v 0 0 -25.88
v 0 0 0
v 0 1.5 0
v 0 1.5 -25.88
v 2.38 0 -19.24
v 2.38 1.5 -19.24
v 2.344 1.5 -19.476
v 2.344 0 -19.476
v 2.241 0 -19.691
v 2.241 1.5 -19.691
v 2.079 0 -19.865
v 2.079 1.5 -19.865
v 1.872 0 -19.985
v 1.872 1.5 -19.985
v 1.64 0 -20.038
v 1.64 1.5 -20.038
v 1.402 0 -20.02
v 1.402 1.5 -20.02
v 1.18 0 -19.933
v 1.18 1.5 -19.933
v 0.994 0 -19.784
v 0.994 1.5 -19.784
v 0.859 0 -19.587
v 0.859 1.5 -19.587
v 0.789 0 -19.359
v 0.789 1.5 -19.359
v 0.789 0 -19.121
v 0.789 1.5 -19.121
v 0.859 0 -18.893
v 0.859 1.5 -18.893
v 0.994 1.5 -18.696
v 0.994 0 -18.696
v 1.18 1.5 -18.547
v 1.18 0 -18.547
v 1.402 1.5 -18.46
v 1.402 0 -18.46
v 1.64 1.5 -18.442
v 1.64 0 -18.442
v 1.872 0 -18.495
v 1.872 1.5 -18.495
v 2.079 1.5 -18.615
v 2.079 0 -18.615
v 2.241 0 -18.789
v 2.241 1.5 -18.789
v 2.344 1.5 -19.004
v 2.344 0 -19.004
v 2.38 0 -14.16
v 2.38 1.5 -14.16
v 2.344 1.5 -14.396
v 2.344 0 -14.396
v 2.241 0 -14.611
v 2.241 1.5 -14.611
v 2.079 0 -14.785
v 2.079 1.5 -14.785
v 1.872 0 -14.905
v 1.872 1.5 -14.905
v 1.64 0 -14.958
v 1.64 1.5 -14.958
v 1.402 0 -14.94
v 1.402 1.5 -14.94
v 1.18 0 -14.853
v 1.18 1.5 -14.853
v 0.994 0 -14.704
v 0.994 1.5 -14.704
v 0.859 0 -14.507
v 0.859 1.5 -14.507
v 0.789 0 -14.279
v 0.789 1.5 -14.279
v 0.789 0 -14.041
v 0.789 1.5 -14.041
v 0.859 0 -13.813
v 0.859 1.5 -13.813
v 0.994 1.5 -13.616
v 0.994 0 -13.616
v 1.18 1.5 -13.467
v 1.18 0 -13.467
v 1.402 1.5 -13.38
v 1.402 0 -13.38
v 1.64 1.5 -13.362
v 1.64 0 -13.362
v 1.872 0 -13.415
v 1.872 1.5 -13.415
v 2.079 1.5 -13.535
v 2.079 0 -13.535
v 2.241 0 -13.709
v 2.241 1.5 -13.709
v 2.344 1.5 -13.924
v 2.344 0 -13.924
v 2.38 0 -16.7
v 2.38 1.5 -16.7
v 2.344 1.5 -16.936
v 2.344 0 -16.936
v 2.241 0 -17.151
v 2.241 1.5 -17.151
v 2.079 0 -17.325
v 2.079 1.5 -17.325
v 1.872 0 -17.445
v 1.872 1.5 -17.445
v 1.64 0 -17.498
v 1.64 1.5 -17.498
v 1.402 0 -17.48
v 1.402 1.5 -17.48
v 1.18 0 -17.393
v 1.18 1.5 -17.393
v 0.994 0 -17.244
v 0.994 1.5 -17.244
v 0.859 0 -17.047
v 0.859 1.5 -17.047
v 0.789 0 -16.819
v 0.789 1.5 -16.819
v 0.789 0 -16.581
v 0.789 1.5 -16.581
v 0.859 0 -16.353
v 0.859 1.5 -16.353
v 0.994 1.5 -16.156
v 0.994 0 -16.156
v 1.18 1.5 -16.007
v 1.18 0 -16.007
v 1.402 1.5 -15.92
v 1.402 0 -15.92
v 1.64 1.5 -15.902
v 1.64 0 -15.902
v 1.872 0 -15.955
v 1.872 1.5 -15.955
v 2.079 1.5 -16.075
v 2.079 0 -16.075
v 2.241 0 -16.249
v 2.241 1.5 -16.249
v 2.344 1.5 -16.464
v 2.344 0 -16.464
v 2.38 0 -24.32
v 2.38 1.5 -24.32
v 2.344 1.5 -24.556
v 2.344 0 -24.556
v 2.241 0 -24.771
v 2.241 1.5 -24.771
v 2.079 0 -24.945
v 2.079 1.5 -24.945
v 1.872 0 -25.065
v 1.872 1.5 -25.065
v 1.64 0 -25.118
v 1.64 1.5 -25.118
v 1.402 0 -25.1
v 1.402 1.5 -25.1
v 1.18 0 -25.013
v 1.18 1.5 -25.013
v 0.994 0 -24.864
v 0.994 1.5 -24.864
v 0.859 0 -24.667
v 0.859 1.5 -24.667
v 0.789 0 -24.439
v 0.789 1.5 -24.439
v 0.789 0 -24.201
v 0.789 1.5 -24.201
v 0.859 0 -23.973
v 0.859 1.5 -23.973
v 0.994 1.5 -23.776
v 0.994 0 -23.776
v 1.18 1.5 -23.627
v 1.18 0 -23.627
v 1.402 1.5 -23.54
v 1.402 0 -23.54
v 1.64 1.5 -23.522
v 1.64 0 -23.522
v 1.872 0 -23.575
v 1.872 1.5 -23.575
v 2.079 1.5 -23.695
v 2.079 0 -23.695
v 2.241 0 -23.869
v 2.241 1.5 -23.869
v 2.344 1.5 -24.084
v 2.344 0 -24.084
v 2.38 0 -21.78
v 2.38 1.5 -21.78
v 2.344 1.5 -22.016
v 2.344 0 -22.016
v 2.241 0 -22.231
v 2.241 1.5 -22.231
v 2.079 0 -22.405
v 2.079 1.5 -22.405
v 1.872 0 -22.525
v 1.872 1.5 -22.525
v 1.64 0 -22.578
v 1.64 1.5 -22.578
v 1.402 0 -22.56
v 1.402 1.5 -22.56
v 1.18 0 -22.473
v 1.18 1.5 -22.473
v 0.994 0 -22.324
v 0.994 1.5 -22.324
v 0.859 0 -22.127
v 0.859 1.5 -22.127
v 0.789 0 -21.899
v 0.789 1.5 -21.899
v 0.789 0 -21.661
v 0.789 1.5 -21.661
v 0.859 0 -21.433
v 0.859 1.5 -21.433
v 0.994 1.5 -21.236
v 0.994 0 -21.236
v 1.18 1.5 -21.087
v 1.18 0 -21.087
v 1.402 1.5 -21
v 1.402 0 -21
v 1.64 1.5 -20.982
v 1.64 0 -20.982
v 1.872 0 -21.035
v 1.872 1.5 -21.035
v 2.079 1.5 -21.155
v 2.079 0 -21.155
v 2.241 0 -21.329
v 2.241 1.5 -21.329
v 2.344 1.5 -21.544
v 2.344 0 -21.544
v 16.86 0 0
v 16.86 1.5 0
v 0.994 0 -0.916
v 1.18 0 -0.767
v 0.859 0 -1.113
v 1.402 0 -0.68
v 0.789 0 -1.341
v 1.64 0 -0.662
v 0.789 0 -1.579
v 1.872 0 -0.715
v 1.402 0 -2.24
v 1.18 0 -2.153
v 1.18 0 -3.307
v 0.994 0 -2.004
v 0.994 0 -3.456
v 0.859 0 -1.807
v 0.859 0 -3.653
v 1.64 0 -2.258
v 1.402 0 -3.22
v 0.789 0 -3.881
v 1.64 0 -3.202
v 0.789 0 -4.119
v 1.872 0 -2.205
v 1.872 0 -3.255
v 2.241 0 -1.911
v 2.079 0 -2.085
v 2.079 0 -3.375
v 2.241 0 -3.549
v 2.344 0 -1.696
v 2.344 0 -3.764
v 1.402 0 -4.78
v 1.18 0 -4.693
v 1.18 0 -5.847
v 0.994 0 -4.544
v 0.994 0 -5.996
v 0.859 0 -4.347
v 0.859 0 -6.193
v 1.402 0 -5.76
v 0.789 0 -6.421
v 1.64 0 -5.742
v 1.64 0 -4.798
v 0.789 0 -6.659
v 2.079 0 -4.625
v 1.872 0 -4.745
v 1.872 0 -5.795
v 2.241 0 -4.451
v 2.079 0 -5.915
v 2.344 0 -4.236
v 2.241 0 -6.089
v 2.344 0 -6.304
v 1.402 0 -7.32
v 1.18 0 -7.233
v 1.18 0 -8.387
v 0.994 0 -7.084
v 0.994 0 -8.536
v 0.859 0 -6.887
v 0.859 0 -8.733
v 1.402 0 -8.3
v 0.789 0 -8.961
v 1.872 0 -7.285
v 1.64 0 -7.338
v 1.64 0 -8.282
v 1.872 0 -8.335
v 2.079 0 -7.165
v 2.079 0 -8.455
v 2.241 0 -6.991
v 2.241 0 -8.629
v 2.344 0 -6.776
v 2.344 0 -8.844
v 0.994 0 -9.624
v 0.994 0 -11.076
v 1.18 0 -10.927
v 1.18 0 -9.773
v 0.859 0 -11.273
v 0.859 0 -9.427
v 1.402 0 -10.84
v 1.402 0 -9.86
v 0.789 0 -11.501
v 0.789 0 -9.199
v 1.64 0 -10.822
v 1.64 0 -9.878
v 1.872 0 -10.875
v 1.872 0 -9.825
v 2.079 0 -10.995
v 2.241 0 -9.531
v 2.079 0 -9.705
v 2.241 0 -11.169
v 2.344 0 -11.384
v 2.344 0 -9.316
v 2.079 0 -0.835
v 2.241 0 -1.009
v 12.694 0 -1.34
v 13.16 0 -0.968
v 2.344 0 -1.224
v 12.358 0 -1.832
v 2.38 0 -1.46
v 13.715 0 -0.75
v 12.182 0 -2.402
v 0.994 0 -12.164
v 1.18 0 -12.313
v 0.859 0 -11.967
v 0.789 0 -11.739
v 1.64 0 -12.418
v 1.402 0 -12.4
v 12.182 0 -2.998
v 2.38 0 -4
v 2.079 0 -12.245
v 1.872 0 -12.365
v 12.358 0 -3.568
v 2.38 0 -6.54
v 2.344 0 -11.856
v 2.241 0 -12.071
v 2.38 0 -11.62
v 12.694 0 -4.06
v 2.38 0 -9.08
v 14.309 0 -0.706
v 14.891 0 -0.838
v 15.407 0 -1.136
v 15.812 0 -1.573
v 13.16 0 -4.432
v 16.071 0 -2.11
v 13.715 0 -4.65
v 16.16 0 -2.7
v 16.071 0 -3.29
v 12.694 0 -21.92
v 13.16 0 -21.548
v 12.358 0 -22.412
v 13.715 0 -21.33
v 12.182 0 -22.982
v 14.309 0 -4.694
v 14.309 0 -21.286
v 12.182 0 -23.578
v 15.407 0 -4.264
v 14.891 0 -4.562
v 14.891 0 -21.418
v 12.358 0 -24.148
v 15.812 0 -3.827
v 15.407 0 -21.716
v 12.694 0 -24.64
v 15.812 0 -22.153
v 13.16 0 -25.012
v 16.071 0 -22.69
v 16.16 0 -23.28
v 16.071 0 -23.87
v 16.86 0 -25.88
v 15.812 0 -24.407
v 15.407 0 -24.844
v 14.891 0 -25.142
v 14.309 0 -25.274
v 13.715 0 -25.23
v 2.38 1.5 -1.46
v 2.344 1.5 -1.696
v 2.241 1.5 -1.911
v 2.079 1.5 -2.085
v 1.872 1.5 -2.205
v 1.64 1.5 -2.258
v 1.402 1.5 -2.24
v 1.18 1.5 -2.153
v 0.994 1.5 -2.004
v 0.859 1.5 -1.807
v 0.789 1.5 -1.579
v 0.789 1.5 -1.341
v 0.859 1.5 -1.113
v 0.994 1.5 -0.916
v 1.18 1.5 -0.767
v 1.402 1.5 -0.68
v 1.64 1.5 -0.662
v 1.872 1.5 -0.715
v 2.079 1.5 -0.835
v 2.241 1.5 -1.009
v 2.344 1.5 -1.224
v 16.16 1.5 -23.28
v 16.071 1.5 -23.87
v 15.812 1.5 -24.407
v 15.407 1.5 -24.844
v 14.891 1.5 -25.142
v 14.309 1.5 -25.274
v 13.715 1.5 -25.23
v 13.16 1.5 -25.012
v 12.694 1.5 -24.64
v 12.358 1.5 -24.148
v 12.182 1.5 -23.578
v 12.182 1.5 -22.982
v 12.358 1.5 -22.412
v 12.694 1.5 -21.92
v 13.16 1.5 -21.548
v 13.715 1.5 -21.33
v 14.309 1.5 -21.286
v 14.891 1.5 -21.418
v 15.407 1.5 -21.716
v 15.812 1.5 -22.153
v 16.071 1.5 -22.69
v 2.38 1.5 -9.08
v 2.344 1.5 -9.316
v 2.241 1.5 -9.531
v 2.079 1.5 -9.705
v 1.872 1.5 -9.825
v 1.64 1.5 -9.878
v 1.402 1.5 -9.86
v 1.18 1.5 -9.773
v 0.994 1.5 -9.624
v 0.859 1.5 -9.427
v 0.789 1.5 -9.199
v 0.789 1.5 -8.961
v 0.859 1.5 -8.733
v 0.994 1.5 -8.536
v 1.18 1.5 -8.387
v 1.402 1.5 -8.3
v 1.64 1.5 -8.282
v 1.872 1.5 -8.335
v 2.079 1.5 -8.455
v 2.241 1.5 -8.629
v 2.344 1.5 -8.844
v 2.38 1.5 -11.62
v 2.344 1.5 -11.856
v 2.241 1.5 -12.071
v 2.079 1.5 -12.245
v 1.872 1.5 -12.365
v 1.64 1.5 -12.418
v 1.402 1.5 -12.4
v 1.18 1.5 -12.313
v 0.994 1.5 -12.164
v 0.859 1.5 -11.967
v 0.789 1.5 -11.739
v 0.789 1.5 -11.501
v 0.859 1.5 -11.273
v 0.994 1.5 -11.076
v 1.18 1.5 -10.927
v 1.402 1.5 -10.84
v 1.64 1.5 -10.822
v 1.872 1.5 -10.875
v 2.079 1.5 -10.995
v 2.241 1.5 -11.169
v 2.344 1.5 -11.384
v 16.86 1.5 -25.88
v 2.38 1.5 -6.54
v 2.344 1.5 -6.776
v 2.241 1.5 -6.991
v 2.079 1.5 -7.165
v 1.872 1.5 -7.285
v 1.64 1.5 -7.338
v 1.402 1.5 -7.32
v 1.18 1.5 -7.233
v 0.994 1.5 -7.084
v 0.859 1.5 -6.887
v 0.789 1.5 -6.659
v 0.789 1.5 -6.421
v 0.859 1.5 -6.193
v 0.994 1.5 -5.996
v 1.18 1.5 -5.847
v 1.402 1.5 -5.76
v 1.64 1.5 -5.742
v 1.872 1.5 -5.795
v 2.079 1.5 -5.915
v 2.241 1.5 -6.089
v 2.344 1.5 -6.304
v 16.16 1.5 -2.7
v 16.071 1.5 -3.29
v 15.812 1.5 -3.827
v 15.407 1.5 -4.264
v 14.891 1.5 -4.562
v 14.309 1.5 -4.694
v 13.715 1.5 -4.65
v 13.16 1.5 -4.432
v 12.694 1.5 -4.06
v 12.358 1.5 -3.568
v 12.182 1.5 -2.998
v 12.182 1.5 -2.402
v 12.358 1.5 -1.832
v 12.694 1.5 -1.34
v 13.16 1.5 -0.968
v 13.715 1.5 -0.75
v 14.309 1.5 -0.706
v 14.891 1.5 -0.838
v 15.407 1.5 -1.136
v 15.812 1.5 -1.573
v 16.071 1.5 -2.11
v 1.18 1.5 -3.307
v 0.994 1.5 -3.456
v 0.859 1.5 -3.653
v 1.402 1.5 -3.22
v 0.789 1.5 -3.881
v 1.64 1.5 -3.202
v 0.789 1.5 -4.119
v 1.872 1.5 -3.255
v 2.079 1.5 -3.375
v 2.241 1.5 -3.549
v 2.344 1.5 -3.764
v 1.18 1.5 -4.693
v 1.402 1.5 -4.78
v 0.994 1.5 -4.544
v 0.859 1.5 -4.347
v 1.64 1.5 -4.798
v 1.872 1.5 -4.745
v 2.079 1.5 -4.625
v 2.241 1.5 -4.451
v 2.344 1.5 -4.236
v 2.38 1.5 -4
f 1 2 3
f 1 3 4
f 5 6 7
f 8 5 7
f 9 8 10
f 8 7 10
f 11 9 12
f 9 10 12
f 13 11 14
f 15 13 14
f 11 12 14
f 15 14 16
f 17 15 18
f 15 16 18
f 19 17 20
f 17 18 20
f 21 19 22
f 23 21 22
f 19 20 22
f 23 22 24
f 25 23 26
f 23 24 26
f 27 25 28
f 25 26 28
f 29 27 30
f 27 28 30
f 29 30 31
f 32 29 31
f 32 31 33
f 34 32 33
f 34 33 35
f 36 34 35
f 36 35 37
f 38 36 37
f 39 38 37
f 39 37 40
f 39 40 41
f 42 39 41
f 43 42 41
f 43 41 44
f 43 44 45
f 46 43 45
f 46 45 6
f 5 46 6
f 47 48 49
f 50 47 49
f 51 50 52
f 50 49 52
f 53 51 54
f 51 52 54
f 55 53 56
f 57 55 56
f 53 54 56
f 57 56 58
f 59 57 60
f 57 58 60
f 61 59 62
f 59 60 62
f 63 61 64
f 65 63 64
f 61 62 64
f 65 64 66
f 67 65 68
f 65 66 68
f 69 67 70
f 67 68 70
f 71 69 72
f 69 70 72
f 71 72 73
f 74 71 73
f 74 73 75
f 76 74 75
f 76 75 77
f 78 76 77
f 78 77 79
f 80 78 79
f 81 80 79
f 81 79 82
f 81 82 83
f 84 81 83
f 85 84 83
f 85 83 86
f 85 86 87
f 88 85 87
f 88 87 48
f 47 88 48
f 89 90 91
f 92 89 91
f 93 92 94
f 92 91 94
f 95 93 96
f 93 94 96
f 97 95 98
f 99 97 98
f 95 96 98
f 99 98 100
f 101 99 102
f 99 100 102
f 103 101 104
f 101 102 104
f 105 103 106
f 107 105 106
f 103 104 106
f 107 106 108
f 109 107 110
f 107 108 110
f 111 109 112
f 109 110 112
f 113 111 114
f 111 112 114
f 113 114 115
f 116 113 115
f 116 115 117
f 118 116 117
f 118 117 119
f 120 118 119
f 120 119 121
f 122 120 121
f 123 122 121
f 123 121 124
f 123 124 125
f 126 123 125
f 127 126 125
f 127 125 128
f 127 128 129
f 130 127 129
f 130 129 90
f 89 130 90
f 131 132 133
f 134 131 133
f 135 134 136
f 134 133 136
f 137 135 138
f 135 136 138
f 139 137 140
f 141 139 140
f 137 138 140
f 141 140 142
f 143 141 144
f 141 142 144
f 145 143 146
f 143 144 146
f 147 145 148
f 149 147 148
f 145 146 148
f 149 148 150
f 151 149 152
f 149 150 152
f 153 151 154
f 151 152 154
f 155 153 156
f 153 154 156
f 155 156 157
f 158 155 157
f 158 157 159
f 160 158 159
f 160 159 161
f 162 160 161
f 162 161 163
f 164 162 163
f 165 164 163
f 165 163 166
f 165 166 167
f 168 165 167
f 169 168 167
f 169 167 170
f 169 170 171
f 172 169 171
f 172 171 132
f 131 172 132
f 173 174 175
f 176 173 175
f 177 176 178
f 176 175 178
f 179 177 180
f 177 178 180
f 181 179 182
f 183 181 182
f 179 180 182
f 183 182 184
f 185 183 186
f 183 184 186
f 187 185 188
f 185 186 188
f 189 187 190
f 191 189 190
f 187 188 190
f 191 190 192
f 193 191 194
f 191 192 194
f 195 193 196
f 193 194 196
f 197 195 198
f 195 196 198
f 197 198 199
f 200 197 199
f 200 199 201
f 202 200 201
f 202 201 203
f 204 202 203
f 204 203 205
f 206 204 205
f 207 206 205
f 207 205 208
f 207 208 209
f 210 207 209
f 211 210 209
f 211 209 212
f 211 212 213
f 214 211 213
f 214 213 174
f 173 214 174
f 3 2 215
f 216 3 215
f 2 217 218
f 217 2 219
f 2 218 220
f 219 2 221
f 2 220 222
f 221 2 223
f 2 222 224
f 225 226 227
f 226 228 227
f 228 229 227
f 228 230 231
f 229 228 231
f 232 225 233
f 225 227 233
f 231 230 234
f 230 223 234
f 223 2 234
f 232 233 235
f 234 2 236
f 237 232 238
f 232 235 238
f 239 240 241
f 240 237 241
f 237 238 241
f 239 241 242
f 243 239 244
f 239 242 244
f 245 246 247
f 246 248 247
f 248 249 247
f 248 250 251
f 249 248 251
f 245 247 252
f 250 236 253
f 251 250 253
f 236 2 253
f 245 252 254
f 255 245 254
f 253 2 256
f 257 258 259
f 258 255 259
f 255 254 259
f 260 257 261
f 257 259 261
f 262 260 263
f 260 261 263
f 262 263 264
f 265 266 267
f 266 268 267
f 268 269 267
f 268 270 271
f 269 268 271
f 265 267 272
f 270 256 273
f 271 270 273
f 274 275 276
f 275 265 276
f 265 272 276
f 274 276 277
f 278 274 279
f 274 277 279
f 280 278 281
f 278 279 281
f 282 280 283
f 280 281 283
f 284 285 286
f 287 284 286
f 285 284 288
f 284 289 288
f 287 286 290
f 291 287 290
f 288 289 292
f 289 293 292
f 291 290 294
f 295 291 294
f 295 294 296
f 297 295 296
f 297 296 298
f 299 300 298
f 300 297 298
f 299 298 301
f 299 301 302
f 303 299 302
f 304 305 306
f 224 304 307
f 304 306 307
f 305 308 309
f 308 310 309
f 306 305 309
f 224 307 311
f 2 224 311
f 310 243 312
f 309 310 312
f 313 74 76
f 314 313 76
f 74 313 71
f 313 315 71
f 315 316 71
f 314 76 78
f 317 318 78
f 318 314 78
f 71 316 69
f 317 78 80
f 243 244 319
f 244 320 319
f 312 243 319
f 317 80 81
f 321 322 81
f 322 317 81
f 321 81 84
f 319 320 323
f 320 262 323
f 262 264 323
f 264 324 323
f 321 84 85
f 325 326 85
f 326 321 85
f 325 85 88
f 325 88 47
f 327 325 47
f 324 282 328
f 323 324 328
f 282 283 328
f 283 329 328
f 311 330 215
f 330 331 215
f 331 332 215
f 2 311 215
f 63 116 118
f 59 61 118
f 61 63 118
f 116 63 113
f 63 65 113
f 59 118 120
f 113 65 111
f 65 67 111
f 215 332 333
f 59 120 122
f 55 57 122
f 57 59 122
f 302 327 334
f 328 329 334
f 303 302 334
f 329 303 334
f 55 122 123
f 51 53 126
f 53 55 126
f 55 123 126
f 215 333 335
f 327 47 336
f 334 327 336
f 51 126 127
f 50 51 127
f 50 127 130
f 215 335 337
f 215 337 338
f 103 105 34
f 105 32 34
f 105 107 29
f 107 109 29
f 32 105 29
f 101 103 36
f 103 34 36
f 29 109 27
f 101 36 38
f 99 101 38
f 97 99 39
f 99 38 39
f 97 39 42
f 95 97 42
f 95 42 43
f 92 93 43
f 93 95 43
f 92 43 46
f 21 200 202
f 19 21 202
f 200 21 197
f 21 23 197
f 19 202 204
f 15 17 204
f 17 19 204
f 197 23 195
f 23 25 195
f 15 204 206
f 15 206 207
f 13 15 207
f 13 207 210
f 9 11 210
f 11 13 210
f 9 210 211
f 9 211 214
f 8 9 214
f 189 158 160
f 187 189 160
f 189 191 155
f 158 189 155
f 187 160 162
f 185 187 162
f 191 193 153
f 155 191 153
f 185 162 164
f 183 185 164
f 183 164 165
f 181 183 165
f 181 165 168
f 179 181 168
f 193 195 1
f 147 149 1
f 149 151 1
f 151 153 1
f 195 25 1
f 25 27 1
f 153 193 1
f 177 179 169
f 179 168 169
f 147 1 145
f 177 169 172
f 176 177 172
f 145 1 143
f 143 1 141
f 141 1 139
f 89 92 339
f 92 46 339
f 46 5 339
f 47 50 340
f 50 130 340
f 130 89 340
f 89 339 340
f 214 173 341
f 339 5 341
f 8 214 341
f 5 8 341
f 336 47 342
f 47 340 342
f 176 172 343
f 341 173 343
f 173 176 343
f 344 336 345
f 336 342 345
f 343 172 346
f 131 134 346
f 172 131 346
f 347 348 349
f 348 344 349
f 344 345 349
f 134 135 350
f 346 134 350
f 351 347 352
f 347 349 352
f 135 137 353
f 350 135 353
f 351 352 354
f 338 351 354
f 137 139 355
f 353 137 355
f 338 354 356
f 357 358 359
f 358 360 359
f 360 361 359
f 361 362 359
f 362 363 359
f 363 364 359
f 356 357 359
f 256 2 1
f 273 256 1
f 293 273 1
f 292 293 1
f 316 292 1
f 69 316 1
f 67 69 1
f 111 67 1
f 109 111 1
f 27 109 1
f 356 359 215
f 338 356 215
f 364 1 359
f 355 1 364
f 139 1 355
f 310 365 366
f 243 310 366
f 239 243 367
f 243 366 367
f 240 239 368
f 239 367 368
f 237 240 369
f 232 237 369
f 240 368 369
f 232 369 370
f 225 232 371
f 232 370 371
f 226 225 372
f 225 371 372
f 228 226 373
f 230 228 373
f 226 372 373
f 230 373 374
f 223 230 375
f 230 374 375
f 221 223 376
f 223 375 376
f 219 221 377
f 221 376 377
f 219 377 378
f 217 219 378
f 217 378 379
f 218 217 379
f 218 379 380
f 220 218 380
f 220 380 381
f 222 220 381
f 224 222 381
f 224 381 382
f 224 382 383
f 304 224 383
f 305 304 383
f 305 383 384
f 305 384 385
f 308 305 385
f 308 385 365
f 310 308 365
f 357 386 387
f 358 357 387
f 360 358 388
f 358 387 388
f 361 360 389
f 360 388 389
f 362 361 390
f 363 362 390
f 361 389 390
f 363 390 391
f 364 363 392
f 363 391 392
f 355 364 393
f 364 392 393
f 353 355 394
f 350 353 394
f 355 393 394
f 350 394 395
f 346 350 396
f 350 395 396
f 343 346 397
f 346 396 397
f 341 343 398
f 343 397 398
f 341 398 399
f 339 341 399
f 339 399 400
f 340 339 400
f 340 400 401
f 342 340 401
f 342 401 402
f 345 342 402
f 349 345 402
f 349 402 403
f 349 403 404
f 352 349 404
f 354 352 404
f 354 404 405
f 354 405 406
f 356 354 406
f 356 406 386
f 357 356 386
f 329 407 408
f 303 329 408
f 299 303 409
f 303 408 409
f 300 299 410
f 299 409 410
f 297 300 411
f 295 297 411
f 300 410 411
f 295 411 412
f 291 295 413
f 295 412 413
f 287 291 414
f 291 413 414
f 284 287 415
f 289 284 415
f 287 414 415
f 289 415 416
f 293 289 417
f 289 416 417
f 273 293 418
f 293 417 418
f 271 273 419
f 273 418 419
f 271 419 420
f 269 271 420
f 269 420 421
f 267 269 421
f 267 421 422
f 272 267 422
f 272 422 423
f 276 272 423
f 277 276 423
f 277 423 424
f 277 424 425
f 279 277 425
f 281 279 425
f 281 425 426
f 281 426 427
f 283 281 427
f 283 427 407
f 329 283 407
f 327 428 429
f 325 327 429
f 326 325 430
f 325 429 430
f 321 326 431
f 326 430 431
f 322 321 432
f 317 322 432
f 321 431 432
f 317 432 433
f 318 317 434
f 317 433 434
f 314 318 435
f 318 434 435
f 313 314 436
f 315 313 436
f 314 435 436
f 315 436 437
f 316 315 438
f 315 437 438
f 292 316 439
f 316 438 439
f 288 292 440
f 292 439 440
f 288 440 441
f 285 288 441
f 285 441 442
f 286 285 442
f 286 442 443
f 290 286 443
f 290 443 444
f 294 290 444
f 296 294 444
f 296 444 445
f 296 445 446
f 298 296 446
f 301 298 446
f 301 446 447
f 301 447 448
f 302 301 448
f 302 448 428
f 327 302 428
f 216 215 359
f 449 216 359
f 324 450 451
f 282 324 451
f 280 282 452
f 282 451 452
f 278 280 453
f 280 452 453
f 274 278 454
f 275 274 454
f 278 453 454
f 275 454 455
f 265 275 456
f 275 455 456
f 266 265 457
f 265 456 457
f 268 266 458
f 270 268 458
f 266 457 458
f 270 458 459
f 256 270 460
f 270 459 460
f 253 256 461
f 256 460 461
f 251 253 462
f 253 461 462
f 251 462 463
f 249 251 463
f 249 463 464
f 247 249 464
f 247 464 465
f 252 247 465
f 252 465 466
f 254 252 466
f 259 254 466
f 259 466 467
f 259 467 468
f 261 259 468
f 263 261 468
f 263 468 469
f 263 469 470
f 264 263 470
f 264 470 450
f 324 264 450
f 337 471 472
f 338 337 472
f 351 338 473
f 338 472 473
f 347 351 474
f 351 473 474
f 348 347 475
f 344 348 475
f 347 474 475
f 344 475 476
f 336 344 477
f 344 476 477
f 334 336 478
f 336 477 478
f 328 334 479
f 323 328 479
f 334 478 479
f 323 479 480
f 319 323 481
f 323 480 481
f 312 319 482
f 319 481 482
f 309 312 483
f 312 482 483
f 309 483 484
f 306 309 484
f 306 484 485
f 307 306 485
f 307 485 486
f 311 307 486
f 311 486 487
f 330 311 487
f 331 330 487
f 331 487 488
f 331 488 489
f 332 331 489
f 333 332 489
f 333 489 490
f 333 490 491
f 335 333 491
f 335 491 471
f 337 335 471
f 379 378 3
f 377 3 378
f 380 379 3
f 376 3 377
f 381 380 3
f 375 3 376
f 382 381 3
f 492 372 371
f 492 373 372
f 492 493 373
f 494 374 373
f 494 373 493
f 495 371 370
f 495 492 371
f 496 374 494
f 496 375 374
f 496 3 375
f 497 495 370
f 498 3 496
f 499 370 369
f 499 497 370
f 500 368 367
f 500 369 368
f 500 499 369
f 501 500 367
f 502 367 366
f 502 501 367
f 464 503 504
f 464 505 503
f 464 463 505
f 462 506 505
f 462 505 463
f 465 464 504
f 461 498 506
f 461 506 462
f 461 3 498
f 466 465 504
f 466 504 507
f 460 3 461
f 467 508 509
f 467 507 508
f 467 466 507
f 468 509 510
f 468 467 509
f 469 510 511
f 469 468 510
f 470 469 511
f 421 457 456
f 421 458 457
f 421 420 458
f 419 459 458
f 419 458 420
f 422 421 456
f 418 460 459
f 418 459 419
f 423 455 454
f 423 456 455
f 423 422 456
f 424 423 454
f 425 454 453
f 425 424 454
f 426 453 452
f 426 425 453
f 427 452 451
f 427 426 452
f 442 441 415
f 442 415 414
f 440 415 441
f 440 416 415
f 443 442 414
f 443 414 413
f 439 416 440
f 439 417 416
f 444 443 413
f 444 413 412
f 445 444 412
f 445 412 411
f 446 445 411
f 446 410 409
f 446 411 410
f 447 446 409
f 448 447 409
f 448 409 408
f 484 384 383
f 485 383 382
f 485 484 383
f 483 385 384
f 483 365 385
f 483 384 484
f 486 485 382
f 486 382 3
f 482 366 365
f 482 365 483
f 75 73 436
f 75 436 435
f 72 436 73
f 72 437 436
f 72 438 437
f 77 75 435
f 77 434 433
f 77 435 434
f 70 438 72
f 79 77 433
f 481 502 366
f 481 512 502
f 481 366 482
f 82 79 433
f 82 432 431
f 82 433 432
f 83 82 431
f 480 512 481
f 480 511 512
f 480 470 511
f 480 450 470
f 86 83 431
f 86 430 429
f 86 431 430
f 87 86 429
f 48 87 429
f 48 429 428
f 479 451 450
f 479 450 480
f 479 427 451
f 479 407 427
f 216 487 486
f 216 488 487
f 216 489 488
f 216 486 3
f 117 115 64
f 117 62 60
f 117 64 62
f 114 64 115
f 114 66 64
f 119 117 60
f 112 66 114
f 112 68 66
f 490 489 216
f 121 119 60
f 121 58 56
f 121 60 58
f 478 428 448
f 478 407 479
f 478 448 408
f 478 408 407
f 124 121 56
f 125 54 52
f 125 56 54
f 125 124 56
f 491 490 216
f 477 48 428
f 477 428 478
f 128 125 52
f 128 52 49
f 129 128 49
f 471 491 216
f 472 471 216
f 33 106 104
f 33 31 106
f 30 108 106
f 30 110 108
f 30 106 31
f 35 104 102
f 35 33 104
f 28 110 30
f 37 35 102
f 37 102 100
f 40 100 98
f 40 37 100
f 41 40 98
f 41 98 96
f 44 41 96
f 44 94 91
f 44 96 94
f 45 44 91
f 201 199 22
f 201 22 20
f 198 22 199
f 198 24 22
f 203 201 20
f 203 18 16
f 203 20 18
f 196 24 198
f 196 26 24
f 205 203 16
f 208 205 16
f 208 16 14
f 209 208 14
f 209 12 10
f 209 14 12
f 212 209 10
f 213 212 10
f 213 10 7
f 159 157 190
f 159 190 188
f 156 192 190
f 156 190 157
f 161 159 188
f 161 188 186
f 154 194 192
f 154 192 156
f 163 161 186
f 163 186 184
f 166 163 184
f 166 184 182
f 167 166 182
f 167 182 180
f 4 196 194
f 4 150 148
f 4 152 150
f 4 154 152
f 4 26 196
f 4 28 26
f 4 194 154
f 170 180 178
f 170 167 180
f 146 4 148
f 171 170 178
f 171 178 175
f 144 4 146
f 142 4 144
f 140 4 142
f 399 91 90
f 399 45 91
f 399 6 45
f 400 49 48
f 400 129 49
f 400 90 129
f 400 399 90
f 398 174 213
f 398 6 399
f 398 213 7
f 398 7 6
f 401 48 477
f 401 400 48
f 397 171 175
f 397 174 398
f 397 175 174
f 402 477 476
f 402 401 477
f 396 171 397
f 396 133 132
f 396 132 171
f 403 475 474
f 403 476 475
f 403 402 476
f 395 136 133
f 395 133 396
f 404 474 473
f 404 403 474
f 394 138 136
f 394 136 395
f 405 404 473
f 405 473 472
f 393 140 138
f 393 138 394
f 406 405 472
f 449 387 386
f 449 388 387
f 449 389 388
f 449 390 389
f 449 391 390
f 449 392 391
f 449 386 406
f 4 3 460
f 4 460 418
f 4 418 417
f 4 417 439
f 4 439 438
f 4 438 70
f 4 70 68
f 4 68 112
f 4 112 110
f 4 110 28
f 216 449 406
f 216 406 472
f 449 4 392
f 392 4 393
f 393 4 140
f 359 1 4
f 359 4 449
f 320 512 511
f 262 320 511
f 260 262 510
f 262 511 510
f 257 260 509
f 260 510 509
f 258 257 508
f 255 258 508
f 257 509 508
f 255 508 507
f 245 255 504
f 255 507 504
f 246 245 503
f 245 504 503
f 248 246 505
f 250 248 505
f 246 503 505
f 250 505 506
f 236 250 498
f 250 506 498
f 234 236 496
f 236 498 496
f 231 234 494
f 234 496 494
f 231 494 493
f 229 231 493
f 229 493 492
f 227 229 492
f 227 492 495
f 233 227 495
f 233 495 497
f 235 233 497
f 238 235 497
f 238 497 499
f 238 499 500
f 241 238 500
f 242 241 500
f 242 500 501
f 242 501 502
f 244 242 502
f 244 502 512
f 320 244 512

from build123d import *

# Parameters (mm, degrees)
SKETCH1_W           = 16.86
SKETCH1_H           = 25.88
BOSS_EXTRUDE1_DEPTH = 1.5
CUT_EXTRUDE1_REACH  = 3.5
SKETCH2_R           = 2
CUT_EXTRUDE2_REACH  = 3.5
SKETCH3_R           = 0.8


with BuildPart() as part:
    # Sketch1 → Boss-Extrude1 (new body)
    with BuildSketch(Plane(origin=(0, 0, 0), x_dir=(1, 0, 0), z_dir=(0, 1, 0))):
        with Locations((8.43, 12.94)):
            Rectangle(SKETCH1_W, SKETCH1_H)
    extrude(amount=BOSS_EXTRUDE1_DEPTH)

    # Sketch2 → Cut-Extrude1 (cut, up to next)
    with BuildSketch(Plane(origin=(0, 1.5, 0), x_dir=(1, 0, 0), z_dir=(0, 1, 0)), mode=Mode.PRIVATE) as cut_extrude1_sk1:
        with Locations((14.16, 23.28)):
            Circle(SKETCH2_R)
    cut_extrude1_tool1 = extrude(cut_extrude1_sk1.sketch, amount=-CUT_EXTRUDE1_REACH, mode=Mode.PRIVATE) & part.part
    add(cut_extrude1_tool1.solids().sort_by_distance((14.16, 1.5, -23.28))[0], mode=Mode.SUBTRACT)
    # Sketch2 → Cut-Extrude1 (cut, up to next)
    with BuildSketch(Plane(origin=(0, 1.5, 0), x_dir=(1, 0, 0), z_dir=(0, 1, 0)), mode=Mode.PRIVATE) as cut_extrude1_sk2:
        with Locations((14.16, 2.7)):
            Circle(SKETCH2_R)
    cut_extrude1_tool2 = extrude(cut_extrude1_sk2.sketch, amount=-CUT_EXTRUDE1_REACH, mode=Mode.PRIVATE) & part.part
    add(cut_extrude1_tool2.solids().sort_by_distance((14.16, 1.5, -2.7))[0], mode=Mode.SUBTRACT)

    # Sketch3 → Cut-Extrude2 (cut, up to next)
    with BuildSketch(Plane(origin=(0, 1.5, 0), x_dir=(1, 0, 0), z_dir=(0, 1, 0)), mode=Mode.PRIVATE) as cut_extrude2_sk1:
        with Locations((1.58, 24.32)):
            Circle(SKETCH3_R)
    cut_extrude2_tool1 = extrude(cut_extrude2_sk1.sketch, amount=-CUT_EXTRUDE2_REACH, mode=Mode.PRIVATE) & part.part
    add(cut_extrude2_tool1.solids().sort_by_distance((1.58, 1.5, -24.32))[0], mode=Mode.SUBTRACT)
    # Sketch3 → Cut-Extrude2 (cut, up to next)
    with BuildSketch(Plane(origin=(0, 1.5, 0), x_dir=(1, 0, 0), z_dir=(0, 1, 0)), mode=Mode.PRIVATE) as cut_extrude2_sk2:
        with Locations((1.58, 21.78)):
            Circle(SKETCH3_R)
    cut_extrude2_tool2 = extrude(cut_extrude2_sk2.sketch, amount=-CUT_EXTRUDE2_REACH, mode=Mode.PRIVATE) & part.part
    add(cut_extrude2_tool2.solids().sort_by_distance((1.58, 1.5, -21.78))[0], mode=Mode.SUBTRACT)
    # Sketch3 → Cut-Extrude2 (cut, up to next)
    with BuildSketch(Plane(origin=(0, 1.5, 0), x_dir=(1, 0, 0), z_dir=(0, 1, 0)), mode=Mode.PRIVATE) as cut_extrude2_sk3:
        with Locations((1.58, 19.24)):
            Circle(SKETCH3_R)
    cut_extrude2_tool3 = extrude(cut_extrude2_sk3.sketch, amount=-CUT_EXTRUDE2_REACH, mode=Mode.PRIVATE) & part.part
    add(cut_extrude2_tool3.solids().sort_by_distance((1.58, 1.5, -19.24))[0], mode=Mode.SUBTRACT)
    # Sketch3 → Cut-Extrude2 (cut, up to next)
    with BuildSketch(Plane(origin=(0, 1.5, 0), x_dir=(1, 0, 0), z_dir=(0, 1, 0)), mode=Mode.PRIVATE) as cut_extrude2_sk4:
        with Locations((1.58, 16.7)):
            Circle(SKETCH3_R)
    cut_extrude2_tool4 = extrude(cut_extrude2_sk4.sketch, amount=-CUT_EXTRUDE2_REACH, mode=Mode.PRIVATE) & part.part
    add(cut_extrude2_tool4.solids().sort_by_distance((1.58, 1.5, -16.7))[0], mode=Mode.SUBTRACT)
    # Sketch3 → Cut-Extrude2 (cut, up to next)
    with BuildSketch(Plane(origin=(0, 1.5, 0), x_dir=(1, 0, 0), z_dir=(0, 1, 0)), mode=Mode.PRIVATE) as cut_extrude2_sk5:
        with Locations((1.58, 14.16)):
            Circle(SKETCH3_R)
    cut_extrude2_tool5 = extrude(cut_extrude2_sk5.sketch, amount=-CUT_EXTRUDE2_REACH, mode=Mode.PRIVATE) & part.part
    add(cut_extrude2_tool5.solids().sort_by_distance((1.58, 1.5, -14.16))[0], mode=Mode.SUBTRACT)
    # Sketch3 → Cut-Extrude2 (cut, up to next)
    with BuildSketch(Plane(origin=(0, 1.5, 0), x_dir=(1, 0, 0), z_dir=(0, 1, 0)), mode=Mode.PRIVATE) as cut_extrude2_sk6:
        with Locations((1.58, 11.62)):
            Circle(SKETCH3_R)
    cut_extrude2_tool6 = extrude(cut_extrude2_sk6.sketch, amount=-CUT_EXTRUDE2_REACH, mode=Mode.PRIVATE) & part.part
    add(cut_extrude2_tool6.solids().sort_by_distance((1.58, 1.5, -11.62))[0], mode=Mode.SUBTRACT)
    # Sketch3 → Cut-Extrude2 (cut, up to next)
    with BuildSketch(Plane(origin=(0, 1.5, 0), x_dir=(1, 0, 0), z_dir=(0, 1, 0)), mode=Mode.PRIVATE) as cut_extrude2_sk7:
        with Locations((1.58, 9.08)):
            Circle(SKETCH3_R)
    cut_extrude2_tool7 = extrude(cut_extrude2_sk7.sketch, amount=-CUT_EXTRUDE2_REACH, mode=Mode.PRIVATE) & part.part
    add(cut_extrude2_tool7.solids().sort_by_distance((1.58, 1.5, -9.08))[0], mode=Mode.SUBTRACT)
    # Sketch3 → Cut-Extrude2 (cut, up to next)
    with BuildSketch(Plane(origin=(0, 1.5, 0), x_dir=(1, 0, 0), z_dir=(0, 1, 0)), mode=Mode.PRIVATE) as cut_extrude2_sk8:
        with Locations((1.58, 6.54)):
            Circle(SKETCH3_R)
    cut_extrude2_tool8 = extrude(cut_extrude2_sk8.sketch, amount=-CUT_EXTRUDE2_REACH, mode=Mode.PRIVATE) & part.part
    add(cut_extrude2_tool8.solids().sort_by_distance((1.58, 1.5, -6.54))[0], mode=Mode.SUBTRACT)
    # Sketch3 → Cut-Extrude2 (cut, up to next)
    with BuildSketch(Plane(origin=(0, 1.5, 0), x_dir=(1, 0, 0), z_dir=(0, 1, 0)), mode=Mode.PRIVATE) as cut_extrude2_sk9:
        with Locations((1.58, 4)):
            Circle(SKETCH3_R)
    cut_extrude2_tool9 = extrude(cut_extrude2_sk9.sketch, amount=-CUT_EXTRUDE2_REACH, mode=Mode.PRIVATE) & part.part
    add(cut_extrude2_tool9.solids().sort_by_distance((1.58, 1.5, -4))[0], mode=Mode.SUBTRACT)
    # Sketch3 → Cut-Extrude2 (cut, up to next)
    with BuildSketch(Plane(origin=(0, 1.5, 0), x_dir=(1, 0, 0), z_dir=(0, 1, 0)), mode=Mode.PRIVATE) as cut_extrude2_sk10:
        with Locations((1.58, 1.46)):
            Circle(SKETCH3_R)
    cut_extrude2_tool10 = extrude(cut_extrude2_sk10.sketch, amount=-CUT_EXTRUDE2_REACH, mode=Mode.PRIVATE) & part.part
    add(cut_extrude2_tool10.solids().sort_by_distance((1.58, 1.5, -1.46))[0], mode=Mode.SUBTRACT)


solid = part.part
